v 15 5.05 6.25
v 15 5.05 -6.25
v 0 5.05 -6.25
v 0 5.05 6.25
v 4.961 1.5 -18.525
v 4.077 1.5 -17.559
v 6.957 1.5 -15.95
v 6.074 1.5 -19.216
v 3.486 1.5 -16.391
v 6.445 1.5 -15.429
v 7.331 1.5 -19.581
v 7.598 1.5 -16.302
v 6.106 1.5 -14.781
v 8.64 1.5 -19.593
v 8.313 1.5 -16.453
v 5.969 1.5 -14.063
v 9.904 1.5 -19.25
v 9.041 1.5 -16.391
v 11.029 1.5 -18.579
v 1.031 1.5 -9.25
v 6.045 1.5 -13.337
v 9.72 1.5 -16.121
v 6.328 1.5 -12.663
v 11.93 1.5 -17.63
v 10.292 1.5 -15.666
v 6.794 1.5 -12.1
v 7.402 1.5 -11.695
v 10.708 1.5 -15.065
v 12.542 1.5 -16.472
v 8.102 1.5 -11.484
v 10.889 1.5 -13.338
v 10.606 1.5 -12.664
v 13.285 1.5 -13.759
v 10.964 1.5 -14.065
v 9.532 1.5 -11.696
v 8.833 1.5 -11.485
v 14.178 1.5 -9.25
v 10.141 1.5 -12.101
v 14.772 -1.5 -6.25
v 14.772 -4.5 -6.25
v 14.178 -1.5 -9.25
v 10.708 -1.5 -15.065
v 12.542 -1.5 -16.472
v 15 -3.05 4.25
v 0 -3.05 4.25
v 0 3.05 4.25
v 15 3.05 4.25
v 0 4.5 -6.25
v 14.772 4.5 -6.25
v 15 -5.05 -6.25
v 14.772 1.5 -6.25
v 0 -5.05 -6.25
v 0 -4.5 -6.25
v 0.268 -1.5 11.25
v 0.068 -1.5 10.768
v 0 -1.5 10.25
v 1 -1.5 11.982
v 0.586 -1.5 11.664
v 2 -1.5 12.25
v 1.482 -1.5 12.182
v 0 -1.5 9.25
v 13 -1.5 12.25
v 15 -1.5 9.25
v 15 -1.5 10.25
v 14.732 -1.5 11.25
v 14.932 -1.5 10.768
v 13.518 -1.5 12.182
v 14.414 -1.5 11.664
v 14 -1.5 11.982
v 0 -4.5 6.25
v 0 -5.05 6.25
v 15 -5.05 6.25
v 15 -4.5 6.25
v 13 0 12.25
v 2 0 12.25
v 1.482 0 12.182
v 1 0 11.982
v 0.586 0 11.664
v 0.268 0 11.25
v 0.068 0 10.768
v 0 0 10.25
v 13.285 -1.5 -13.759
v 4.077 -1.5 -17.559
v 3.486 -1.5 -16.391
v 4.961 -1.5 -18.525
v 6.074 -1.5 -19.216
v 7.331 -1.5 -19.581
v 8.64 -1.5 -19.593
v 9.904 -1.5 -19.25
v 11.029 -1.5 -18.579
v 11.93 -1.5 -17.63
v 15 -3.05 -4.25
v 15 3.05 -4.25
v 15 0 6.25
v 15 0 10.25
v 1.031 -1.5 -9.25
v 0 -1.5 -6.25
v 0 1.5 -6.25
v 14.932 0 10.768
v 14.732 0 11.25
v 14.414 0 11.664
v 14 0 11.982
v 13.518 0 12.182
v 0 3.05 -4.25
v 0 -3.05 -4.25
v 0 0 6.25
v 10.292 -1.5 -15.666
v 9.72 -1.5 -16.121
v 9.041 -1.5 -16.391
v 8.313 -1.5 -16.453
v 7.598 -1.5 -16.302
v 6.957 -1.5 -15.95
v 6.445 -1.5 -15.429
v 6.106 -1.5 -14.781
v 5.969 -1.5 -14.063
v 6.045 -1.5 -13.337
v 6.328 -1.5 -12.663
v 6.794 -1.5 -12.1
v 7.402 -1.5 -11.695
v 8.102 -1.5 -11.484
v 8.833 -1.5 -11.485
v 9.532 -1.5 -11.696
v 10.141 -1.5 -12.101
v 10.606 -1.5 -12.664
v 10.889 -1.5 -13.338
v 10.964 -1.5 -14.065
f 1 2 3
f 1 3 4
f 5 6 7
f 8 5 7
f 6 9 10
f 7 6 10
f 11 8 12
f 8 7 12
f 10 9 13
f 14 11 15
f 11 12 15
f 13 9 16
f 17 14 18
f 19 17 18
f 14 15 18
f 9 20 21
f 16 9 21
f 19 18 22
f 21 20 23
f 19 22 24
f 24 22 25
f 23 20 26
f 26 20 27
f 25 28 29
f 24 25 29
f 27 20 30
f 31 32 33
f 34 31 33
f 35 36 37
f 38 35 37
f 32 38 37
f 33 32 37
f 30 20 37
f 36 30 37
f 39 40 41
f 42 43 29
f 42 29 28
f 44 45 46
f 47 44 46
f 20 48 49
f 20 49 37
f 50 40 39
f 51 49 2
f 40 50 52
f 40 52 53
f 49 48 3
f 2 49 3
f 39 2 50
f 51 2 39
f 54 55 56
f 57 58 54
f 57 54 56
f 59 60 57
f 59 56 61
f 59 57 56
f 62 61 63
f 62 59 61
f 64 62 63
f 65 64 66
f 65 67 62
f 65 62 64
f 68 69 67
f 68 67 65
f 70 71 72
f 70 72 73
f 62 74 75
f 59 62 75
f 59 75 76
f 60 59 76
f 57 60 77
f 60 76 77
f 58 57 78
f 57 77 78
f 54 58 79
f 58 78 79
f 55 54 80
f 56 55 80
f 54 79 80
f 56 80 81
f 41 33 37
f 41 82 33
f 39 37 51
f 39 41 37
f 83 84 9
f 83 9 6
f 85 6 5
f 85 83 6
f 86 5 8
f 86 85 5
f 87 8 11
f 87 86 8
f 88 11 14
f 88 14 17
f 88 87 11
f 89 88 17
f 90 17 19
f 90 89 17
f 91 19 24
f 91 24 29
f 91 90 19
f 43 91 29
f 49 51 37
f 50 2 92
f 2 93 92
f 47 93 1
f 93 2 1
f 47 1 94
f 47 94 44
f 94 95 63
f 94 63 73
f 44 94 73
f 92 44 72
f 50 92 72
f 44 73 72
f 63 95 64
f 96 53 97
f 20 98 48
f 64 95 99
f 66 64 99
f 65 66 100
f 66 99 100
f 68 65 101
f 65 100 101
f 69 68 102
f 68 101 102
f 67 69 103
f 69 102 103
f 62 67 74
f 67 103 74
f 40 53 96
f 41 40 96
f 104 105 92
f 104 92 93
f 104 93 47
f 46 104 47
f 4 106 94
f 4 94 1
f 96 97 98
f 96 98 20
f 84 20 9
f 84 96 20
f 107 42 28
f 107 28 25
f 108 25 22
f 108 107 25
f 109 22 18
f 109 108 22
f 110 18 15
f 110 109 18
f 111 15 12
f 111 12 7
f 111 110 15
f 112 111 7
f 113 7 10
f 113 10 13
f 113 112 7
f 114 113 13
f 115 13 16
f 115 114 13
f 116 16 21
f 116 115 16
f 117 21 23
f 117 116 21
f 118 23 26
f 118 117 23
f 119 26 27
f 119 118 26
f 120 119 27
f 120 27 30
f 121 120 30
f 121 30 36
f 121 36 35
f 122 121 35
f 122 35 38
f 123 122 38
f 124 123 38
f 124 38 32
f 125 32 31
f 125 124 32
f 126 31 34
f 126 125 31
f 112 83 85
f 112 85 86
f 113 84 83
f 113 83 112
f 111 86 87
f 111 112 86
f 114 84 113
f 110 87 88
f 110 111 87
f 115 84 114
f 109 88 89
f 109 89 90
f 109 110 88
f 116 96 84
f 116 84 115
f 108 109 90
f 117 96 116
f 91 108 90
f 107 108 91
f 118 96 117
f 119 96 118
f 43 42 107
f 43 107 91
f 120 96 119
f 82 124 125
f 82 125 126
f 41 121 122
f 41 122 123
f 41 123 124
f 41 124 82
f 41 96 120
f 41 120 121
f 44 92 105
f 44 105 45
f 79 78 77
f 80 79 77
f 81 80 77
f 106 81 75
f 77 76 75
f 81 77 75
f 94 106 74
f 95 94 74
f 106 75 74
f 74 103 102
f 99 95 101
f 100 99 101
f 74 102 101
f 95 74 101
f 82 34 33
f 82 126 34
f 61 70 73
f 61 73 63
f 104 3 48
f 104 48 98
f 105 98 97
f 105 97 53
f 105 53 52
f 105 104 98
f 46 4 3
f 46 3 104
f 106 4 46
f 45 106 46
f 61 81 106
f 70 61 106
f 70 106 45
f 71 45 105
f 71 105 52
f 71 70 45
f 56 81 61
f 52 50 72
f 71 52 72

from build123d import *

# Parameters (mm, degrees)
F0_W         = 10.1
F0_H         = 12.5
F0_W_2       = 6.1
F0_H_2       = 8.5
F1_DEPTH     = 15
F3_DEPTH     = 1.5
F5_DEPTH     = 1.5
F6_T1_DEPTH  = 15
F6_T6_DEPTH  = 22.4868112825
F6_T12_DEPTH = 22.4868112825


# Not quite as in the source:
# - a fillet or chamfer that OpenCascade refuses, or shapes differently, is made with other operations: its cross-section is extruded or revolved along the edge and cut away or added


with BuildPart() as f1:
    # F0 (on Right) → F1 (new body)
    with BuildSketch(Plane.YZ):
        Rectangle(F0_W, F0_H)
        Rectangle(F0_W_2, F0_H_2, mode=Mode.SUBTRACT)
    extrude(amount=F1_DEPTH)

    # F2 (on Front) → F3 (join, symmetric)
    with BuildSketch(Plane.XZ):
        with BuildLine():
            Line((14.7717623186, -6.25), (0, -6.25))
            Line((0, -6.25), (3.4864366891, -16.3906378753))
            ThreePointArc((3.4864366891, -16.3906378753), (7.9854016639, -19.6317508441), (12.5416083041, -16.4716115793))
            Line((12.5416083041, -16.4716115793), (10.7079865556, -15.0650723372))
            ThreePointArc((10.7079865556, -15.0650723372), (6.0450329155, -13.3366260518), (10.964385436, -14.0650723372))
            Line((10.964385436, -14.0650723372), (13.2847928678, -13.7592216636))
            Line((13.2847928678, -13.7592216636), (14.7717623186, -6.25))
        make_face()
    extrude(amount=F3_DEPTH, both=True)

    # F4 (on Front) → F5 (join)
    with BuildSketch(Plane.XZ):
        with BuildLine():
            Line((0, 10.25), (0, 6.25))
            Line((0, 6.25), (15, 6.25))
            Line((15, 6.25), (15, 10.25))
            ThreePointArc((15, 10.25), (14.4142135624, 11.6642135624), (13, 12.25))
            Line((13, 12.25), (2, 12.25))
            ThreePointArc((2, 12.25), (0.5857864376, 11.6642135624), (0, 10.25))
        make_face()
    extrude(amount=F5_DEPTH)

    # F6: chamfer of 3 on 3 edges, made by hand

    # F6_s2 → F6_t1 (join)
    with BuildSketch(Plane.YZ):
        Polygon((-4.5, 6.25), (-1.5, 9.25), (-1.5, 6.25), align=None)
    extrude(amount=F6_T1_DEPTH)


with BuildPart() as f6_tool4:
    # F6_s5 → F6_t6 (new body)
    with BuildSketch(Plane.YZ.offset(22.4868112825)):
        Polygon((-4.5, -6.25), (-1.5, -9.25), (-1.5, -6.25), align=None)
    extrude(amount=-F6_T6_DEPTH)

    split(bisect_by=Plane(origin=(15.4053151941, 0, -3.0505469275), x_dir=(0, 1, 0), z_dir=(-0.9809525786, 0, 0.1942473644)), keep=Keep.TOP)

    split(bisect_by=Plane(origin=(-1.9216548906, 0, -0.6606811324), x_dir=(0, 1, 0), z_dir=(0.945669614, 0, 0.3251291761)), keep=Keep.TOP)


with BuildPart() as f1_1:
    add(f1.part)

    # F6_t3: union F6_tool4
    add(f6_tool4.part)


with BuildPart() as f6_tool10:
    # F6_s11 → F6_t12 (new body)
    with BuildSketch(Plane.YZ.offset(22.4868112825)):
        Polygon((4.5, -6.25), (1.5, -9.25), (1.5, -6.25), align=None)
    extrude(amount=-F6_T12_DEPTH)

    split(bisect_by=Plane(origin=(15.4053151941, 0, -3.0505469275), x_dir=(0, 1, 0), z_dir=(-0.9809525786, 0, 0.1942473644)), keep=Keep.TOP)

    split(bisect_by=Plane(origin=(-1.9216548906, 0, -0.6606811324), x_dir=(0, 1, 0), z_dir=(0.945669614, 0, 0.3251291761)), keep=Keep.TOP)


with BuildPart() as f1_2:
    add(f1_1.part)

    # F6_t9: union F6_tool10
    add(f6_tool10.part)


solid = f1_2.part
